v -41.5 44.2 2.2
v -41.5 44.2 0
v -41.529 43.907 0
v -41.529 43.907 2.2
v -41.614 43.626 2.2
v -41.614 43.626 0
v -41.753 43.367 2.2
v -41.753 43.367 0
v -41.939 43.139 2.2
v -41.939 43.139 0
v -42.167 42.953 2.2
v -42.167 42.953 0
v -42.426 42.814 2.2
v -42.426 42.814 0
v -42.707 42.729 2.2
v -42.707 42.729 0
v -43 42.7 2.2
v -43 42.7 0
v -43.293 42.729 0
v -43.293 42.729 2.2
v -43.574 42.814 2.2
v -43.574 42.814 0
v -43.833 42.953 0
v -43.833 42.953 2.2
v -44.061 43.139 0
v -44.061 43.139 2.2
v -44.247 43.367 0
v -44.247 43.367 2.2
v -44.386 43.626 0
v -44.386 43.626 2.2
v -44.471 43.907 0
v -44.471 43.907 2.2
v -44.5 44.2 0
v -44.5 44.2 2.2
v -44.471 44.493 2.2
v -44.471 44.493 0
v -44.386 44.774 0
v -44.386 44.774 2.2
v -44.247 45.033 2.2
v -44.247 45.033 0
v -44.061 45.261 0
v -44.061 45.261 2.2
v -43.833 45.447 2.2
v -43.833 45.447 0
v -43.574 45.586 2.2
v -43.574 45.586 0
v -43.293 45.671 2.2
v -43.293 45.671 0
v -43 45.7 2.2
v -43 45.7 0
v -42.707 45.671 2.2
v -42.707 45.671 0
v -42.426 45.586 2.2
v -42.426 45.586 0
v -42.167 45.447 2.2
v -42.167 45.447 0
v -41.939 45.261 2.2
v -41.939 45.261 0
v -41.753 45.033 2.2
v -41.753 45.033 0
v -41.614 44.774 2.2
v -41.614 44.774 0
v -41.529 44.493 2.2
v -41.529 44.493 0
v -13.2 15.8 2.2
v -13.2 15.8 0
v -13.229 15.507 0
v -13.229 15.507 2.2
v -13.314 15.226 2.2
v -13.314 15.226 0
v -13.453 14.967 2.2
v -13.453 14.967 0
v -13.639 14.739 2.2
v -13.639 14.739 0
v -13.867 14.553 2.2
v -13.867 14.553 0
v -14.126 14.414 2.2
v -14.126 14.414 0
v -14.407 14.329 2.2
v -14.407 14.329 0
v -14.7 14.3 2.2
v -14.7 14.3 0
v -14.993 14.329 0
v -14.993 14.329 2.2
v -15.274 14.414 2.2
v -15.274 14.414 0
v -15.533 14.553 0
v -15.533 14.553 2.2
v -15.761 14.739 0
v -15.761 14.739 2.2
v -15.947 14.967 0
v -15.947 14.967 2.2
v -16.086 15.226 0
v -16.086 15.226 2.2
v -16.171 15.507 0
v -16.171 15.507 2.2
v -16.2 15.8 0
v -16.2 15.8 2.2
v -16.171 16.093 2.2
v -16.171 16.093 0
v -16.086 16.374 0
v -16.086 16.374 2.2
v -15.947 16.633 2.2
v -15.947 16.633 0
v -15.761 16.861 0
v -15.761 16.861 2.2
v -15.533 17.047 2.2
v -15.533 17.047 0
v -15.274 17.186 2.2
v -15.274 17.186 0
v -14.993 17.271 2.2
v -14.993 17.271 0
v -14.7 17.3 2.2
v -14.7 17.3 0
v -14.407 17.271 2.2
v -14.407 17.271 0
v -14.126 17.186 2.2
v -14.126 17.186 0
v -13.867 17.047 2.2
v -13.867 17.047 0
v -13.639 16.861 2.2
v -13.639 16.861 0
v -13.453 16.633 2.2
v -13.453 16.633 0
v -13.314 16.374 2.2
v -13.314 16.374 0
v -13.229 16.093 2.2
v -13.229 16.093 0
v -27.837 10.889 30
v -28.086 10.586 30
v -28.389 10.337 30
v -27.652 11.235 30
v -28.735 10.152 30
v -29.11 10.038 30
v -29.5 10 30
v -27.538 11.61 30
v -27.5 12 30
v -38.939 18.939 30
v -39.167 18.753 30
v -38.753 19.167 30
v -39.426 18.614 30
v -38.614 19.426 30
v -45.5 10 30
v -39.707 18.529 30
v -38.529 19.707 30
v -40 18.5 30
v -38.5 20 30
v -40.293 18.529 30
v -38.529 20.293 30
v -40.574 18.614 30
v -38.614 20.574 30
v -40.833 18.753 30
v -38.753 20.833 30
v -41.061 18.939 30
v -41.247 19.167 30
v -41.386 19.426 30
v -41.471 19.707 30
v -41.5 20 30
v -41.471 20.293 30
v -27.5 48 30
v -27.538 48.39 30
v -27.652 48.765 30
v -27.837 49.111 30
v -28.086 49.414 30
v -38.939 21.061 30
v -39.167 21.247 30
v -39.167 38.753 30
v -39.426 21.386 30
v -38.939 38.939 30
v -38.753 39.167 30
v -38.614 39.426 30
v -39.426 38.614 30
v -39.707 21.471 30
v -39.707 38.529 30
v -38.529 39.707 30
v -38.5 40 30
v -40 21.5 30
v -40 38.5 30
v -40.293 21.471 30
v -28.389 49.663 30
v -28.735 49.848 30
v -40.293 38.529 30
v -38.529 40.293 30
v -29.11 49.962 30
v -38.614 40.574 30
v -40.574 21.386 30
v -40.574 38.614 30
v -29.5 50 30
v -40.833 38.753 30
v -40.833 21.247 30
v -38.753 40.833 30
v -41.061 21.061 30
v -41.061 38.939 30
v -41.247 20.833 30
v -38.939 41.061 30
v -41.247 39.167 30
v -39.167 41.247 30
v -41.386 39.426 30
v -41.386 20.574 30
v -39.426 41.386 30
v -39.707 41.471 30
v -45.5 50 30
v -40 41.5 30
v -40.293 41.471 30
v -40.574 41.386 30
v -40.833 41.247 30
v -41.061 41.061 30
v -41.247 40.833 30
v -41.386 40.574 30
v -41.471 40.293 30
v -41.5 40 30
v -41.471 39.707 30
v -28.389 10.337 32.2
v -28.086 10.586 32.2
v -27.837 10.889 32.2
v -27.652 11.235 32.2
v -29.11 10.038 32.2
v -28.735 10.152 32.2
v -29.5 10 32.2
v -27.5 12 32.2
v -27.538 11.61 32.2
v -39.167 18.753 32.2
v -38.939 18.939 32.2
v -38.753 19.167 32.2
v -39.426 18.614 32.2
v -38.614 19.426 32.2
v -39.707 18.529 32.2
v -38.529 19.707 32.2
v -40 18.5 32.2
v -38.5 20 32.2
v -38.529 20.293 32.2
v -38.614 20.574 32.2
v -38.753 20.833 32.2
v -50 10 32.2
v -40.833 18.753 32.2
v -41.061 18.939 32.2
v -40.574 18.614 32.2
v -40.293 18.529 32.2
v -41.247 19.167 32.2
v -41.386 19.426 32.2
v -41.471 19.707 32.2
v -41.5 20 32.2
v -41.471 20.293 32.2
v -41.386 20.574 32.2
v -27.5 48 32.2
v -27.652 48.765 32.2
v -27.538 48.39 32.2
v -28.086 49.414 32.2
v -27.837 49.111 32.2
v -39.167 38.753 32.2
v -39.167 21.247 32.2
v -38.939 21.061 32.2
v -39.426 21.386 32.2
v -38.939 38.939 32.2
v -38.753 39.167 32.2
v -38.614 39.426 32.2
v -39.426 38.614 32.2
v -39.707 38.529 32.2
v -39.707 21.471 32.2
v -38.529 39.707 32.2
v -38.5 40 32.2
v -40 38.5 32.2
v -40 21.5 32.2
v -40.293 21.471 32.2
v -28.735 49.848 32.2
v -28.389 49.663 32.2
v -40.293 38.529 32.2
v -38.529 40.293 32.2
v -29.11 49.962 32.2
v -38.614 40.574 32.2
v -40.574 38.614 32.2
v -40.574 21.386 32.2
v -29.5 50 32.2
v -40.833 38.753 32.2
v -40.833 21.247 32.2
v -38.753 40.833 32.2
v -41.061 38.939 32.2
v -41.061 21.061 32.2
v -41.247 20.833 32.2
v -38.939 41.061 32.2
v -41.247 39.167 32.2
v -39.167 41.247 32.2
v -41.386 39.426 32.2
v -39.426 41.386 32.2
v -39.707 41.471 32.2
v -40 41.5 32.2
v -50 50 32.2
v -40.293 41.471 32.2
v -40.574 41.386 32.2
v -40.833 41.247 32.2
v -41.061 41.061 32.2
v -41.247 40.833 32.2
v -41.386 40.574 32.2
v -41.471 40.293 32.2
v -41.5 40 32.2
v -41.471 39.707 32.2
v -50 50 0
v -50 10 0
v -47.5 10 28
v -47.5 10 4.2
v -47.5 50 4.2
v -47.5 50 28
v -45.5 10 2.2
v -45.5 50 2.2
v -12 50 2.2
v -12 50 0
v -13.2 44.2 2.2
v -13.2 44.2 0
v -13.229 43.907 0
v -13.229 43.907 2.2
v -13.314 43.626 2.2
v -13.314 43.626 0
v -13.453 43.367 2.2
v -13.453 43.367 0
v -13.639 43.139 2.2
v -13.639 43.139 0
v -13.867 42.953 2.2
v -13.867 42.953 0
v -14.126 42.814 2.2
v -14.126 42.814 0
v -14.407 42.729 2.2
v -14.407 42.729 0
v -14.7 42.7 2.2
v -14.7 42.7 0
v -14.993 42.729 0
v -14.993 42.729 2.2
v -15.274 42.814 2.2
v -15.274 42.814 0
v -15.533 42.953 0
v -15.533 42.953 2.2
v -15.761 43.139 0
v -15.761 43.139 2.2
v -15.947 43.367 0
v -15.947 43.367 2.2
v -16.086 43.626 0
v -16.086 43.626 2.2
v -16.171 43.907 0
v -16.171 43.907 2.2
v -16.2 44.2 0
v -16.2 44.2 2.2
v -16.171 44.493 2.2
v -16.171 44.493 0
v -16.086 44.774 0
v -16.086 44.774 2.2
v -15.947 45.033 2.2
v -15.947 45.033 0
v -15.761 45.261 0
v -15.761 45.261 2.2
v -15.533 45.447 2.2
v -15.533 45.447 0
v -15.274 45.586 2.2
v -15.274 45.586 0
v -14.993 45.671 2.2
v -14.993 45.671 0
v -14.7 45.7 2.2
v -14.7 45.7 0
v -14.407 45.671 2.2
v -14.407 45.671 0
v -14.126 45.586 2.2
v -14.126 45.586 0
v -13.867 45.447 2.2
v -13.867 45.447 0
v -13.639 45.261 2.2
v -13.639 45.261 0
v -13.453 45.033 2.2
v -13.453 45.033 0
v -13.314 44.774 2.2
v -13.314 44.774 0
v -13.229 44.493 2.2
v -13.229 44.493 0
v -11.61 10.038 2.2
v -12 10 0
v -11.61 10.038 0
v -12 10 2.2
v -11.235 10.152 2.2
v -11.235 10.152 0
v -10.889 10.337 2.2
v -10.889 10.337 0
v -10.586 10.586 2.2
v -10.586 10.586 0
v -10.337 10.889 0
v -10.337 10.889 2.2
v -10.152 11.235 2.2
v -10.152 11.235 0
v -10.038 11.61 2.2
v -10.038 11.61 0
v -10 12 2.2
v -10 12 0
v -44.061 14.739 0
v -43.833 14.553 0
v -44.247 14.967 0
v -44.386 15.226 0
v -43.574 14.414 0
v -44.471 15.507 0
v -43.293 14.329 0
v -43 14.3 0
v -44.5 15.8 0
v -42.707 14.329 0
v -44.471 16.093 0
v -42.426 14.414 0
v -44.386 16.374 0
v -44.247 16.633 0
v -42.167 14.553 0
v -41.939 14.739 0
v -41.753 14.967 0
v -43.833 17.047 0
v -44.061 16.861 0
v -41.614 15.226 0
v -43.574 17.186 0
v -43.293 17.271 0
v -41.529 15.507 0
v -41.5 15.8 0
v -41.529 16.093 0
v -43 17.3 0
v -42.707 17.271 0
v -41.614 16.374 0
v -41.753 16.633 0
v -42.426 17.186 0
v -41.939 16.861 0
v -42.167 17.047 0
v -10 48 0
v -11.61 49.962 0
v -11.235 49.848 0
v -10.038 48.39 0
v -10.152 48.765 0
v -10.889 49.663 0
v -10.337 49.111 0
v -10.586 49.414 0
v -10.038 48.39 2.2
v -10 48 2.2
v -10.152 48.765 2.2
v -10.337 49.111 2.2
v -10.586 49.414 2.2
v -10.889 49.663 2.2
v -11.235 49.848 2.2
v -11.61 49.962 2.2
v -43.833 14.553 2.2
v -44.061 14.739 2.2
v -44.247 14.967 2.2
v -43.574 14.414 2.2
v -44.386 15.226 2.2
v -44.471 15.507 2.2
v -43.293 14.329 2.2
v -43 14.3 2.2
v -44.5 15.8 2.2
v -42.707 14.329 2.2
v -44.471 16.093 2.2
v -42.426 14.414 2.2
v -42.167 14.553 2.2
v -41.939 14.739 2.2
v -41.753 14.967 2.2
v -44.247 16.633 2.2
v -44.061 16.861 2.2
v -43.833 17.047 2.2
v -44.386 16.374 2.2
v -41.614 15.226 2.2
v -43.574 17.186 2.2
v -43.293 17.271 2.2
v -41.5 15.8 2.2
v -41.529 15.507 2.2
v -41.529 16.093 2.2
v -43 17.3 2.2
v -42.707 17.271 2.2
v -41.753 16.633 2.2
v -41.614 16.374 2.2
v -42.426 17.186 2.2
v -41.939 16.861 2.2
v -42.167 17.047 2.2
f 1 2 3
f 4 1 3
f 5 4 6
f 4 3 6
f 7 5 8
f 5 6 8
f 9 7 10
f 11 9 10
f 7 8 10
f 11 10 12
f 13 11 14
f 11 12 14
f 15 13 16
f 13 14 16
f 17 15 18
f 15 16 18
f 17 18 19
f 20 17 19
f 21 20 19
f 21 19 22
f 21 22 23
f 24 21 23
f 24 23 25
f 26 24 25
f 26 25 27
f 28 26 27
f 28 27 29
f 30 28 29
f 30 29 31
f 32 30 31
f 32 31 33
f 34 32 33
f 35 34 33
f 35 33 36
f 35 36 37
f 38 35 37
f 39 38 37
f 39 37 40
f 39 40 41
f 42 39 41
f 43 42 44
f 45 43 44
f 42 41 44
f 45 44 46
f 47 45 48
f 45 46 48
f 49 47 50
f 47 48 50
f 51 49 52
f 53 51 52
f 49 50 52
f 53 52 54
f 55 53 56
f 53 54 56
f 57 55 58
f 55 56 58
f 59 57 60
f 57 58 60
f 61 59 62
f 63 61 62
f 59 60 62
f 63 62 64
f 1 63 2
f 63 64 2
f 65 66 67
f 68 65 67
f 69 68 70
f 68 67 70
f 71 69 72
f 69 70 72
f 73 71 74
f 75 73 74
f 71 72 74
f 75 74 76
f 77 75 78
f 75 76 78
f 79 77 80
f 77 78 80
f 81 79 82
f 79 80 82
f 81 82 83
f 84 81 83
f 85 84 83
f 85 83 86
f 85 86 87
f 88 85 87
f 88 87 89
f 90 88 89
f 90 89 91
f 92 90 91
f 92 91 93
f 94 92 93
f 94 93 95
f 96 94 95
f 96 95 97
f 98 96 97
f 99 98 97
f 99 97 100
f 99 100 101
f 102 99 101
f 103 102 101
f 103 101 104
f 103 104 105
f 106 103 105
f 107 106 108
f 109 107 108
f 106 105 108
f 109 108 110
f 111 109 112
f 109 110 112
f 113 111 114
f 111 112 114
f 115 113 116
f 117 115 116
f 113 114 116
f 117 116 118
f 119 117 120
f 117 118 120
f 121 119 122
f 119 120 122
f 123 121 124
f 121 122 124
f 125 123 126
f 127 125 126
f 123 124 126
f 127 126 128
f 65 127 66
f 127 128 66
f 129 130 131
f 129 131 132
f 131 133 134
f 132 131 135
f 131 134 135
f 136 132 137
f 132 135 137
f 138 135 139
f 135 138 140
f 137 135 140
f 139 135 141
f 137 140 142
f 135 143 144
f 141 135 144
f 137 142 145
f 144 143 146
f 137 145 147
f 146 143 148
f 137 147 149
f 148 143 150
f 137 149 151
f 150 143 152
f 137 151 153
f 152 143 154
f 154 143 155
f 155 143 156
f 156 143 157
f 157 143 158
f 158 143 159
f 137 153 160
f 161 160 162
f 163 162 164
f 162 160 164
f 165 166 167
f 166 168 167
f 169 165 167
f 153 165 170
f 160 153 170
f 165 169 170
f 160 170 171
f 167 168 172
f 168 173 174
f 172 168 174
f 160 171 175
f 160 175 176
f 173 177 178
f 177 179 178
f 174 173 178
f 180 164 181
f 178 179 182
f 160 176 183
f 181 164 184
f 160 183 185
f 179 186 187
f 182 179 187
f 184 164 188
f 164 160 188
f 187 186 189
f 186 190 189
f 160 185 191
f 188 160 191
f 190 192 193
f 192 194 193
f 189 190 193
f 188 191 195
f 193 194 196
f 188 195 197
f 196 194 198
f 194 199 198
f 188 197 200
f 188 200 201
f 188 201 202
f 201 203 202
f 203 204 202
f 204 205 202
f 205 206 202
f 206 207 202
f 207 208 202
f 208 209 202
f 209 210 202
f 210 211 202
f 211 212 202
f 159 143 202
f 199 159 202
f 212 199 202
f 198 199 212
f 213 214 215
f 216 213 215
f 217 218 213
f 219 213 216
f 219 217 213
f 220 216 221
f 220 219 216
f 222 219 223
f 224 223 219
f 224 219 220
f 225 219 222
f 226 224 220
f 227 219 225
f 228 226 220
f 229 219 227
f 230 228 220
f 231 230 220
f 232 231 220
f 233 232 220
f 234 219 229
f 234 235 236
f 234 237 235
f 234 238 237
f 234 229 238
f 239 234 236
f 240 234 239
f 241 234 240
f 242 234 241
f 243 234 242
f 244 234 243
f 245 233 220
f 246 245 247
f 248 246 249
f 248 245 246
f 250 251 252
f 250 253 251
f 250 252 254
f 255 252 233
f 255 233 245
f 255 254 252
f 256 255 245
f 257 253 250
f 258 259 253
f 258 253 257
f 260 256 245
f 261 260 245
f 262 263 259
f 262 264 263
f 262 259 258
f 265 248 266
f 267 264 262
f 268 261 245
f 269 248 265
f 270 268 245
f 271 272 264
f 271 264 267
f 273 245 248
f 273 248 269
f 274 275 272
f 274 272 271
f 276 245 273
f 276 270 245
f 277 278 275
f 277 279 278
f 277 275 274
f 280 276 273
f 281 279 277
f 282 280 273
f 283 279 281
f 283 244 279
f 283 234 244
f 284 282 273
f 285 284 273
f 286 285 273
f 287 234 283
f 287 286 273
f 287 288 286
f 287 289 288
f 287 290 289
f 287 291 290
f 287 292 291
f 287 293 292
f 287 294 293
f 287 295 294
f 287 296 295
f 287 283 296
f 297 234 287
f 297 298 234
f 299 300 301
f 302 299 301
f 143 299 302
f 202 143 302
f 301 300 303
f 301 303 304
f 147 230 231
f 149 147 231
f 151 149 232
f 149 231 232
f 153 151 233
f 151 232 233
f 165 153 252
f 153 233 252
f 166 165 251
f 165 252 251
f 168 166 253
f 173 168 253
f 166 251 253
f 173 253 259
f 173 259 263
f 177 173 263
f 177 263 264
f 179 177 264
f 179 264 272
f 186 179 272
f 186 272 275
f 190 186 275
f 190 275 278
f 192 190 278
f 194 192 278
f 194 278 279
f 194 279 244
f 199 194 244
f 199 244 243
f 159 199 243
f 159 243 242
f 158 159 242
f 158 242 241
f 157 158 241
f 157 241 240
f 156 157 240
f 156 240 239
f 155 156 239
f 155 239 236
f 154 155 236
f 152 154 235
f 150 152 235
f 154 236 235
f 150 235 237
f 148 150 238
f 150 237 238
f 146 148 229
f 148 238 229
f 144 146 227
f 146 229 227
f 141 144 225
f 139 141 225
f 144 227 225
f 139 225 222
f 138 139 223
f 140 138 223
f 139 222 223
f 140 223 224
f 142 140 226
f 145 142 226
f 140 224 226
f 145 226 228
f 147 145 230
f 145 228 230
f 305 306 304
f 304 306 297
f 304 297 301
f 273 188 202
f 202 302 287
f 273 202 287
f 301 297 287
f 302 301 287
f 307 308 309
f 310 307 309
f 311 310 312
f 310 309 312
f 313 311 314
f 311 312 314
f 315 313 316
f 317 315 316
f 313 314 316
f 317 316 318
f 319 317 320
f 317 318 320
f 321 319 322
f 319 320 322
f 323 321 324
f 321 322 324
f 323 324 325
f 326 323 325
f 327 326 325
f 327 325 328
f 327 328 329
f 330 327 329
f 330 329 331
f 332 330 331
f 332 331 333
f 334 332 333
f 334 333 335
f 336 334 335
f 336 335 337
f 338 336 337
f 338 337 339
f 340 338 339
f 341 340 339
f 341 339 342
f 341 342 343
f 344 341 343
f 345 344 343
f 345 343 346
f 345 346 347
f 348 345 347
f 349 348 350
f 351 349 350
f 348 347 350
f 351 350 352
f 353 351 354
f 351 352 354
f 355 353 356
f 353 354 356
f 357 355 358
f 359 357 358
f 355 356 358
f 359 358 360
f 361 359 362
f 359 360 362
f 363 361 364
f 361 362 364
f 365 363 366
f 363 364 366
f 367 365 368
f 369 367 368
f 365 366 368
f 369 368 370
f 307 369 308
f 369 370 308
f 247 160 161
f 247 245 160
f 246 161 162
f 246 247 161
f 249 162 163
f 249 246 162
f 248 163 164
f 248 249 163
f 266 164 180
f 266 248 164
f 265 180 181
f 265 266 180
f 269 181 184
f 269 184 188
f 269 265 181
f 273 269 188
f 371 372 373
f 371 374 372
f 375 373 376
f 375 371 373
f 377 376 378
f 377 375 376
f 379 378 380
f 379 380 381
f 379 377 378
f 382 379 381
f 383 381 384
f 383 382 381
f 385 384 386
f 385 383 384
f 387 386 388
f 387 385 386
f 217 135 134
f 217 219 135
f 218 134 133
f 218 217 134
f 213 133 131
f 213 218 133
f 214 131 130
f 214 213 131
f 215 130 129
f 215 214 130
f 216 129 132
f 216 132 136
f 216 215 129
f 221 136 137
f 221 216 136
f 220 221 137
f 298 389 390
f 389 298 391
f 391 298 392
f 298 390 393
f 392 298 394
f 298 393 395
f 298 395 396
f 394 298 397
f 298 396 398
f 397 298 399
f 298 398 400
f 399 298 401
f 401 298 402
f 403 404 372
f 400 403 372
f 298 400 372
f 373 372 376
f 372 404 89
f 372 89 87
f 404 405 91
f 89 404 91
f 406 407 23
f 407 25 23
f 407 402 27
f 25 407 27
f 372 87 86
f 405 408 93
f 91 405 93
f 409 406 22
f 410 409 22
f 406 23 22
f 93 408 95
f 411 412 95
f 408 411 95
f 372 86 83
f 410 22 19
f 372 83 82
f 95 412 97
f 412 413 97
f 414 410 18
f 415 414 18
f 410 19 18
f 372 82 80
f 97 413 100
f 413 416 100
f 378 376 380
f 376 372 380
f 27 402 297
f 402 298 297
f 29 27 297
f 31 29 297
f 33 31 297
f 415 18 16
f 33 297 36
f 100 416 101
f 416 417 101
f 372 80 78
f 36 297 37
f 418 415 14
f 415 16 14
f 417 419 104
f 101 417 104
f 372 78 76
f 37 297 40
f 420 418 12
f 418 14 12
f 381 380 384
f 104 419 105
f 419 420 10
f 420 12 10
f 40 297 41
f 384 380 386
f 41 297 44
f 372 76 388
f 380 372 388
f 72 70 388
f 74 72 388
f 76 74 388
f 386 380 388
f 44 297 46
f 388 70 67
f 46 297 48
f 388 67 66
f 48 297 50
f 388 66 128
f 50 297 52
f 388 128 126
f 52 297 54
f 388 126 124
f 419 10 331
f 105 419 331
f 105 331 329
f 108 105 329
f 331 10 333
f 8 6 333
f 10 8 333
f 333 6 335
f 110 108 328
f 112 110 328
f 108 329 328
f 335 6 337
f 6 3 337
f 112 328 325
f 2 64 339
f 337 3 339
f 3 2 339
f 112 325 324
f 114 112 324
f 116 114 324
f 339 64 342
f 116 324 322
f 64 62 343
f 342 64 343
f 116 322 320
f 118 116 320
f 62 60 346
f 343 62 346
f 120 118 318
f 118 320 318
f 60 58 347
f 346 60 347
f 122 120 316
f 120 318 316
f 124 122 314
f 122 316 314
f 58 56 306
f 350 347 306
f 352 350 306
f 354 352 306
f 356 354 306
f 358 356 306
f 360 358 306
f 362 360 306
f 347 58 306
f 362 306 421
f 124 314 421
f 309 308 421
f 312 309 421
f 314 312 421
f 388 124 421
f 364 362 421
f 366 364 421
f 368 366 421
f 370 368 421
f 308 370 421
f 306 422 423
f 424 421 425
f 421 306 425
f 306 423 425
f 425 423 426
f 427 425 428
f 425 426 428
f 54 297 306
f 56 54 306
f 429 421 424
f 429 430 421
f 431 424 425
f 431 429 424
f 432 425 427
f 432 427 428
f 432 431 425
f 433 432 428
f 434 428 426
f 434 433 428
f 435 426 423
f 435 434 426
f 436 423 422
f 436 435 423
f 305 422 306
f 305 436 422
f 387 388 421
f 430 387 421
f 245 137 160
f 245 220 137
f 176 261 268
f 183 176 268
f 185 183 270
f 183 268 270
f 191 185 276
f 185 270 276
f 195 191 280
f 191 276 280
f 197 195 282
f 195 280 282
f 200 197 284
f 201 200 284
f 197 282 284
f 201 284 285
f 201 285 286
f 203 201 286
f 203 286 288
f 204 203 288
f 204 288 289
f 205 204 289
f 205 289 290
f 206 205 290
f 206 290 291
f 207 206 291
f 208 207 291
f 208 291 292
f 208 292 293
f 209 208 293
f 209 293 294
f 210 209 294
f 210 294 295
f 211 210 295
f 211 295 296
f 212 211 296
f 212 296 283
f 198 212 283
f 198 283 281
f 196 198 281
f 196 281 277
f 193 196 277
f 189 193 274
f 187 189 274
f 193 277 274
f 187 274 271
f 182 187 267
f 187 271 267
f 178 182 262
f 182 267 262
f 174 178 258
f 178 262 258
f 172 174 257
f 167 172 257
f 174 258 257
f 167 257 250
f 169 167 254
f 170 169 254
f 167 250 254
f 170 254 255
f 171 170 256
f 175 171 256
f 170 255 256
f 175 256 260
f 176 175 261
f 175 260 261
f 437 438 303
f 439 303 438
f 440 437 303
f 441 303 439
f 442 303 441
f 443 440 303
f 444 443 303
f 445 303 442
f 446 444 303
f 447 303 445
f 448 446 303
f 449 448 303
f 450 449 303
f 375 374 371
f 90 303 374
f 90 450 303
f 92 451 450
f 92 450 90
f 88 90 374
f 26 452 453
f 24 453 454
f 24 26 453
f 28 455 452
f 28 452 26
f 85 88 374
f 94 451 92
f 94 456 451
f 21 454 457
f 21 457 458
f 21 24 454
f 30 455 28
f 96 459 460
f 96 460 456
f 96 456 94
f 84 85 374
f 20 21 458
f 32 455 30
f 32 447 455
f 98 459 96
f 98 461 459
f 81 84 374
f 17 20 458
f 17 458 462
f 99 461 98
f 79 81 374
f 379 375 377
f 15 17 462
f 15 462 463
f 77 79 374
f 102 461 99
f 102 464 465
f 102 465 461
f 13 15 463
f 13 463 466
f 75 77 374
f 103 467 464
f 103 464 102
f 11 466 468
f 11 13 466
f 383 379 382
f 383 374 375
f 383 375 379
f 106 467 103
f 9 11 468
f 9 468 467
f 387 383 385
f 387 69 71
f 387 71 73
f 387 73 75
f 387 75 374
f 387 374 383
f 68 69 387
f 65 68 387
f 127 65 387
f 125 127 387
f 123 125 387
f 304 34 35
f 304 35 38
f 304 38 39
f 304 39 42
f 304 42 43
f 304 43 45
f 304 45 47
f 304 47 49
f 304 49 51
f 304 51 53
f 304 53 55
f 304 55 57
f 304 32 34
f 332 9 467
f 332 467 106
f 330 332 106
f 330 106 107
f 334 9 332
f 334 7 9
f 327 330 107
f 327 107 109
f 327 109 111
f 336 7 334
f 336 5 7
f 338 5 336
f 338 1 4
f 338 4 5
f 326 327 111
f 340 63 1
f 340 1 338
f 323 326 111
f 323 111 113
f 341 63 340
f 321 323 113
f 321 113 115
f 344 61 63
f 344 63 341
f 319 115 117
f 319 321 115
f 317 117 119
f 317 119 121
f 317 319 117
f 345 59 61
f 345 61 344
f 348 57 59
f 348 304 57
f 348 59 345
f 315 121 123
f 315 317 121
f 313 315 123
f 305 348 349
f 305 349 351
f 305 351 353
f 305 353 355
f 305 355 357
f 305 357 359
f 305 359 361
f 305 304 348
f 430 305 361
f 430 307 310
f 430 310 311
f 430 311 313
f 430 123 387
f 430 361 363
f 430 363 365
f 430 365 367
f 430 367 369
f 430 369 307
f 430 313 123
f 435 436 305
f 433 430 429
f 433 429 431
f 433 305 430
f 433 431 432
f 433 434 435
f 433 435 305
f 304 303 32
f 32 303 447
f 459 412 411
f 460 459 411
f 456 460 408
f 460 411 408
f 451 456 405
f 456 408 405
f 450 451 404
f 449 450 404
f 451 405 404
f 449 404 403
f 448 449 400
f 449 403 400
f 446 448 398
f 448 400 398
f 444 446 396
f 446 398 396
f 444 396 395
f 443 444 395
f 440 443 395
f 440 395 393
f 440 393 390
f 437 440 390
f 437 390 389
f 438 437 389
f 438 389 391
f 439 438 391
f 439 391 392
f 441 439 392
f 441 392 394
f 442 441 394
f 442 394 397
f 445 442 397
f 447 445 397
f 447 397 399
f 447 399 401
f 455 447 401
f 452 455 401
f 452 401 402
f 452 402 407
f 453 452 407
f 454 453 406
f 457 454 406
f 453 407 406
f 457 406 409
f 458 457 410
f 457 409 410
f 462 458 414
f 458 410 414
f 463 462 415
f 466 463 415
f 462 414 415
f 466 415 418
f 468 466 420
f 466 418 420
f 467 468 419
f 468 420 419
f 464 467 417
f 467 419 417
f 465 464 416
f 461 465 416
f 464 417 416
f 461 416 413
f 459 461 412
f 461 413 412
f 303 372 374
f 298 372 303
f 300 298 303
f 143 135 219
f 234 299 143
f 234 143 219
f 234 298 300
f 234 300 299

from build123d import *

# Parameters (mm, degrees)
SKETCH003_W     = 40
SKETCH003_H     = 40
PAD002_DEPTH    = 2.2
SKETCH004_W     = 2.5
SKETCH004_H     = 40
PAD003_DEPTH    = 30
SKETCH005_W     = 40
SKETCH005_H     = 2.2
PAD004_DEPTH    = 20
SKETCH006_R     = 1.5
POCKET001_DEPTH = 5
CHAMFER001_SIZE = 2
FILLET001_R     = 2
SKETCH007_R     = 1.5
POCKET002_DEPTH = 5


with BuildPart() as part:
    # Sketch003 → Pad002 (new body)
    with BuildSketch(Plane.XY):
        with Locations((-30, 30)):
            Rectangle(SKETCH003_W, SKETCH003_H)
    extrude(amount=PAD002_DEPTH)

    # Sketch004 (on Face6 of Pad002) → Pad003 (join)
    with BuildSketch(Plane.XY.offset(2.2)):
        with Locations((-48.75, 30)):
            Rectangle(SKETCH004_W, SKETCH004_H)
    extrude(amount=PAD003_DEPTH)

    # Sketch005 (on Face4 of Pad003) → Pad004 (join)
    with BuildSketch(Plane.YZ.offset(-47.5)):
        with Locations((30, 31.1)):
            Rectangle(SKETCH005_W, SKETCH005_H)
    extrude(amount=PAD004_DEPTH)

    # Sketch006 (on Face10 of Pad004) → Pocket001 (cut)
    with BuildSketch(Plane.XY.offset(32.2)):
        with Locations((-40, 40)):
            Circle(SKETCH006_R)
        with Locations((-40, 20)):
            Circle(SKETCH006_R)
    extrude(amount=-POCKET001_DEPTH, mode=Mode.SUBTRACT)

    # Chamfer001
    chamfer001_edges = [part.edges().sort_by_distance(p)[0] for p in [
        (-47.5, 30, 2.2),
        (-47.5, 30, 30),
    ]]
    chamfer(chamfer001_edges, length=CHAMFER001_SIZE)

    # Fillet001
    fillet001_edges = [part.edges().sort_by_distance(p)[0] for p in [
        (-27.5, 10, 31.1),
        (-10, 10, 1.1),
        (-27.5, 50, 31.1),
        (-10, 50, 1.1),
    ]]
    fillet(fillet001_edges, radius=FILLET001_R)

    # Sketch007 (on Face5 of Fillet001) → Pocket002 (cut)
    with BuildSketch(Plane(origin=(0, 0, 0), x_dir=(1, 0, 0), z_dir=(0, 0, -1))):
        with Locations((-43, -15.8)):
            Circle(SKETCH007_R)
        with Locations((-14.7, -15.8)):
            Circle(SKETCH007_R)
        with Locations((-43, -44.2)):
            Circle(SKETCH007_R)
        with Locations((-14.7, -44.2)):
            Circle(SKETCH007_R)
    extrude(amount=-POCKET002_DEPTH, mode=Mode.SUBTRACT)


solid = part.part
